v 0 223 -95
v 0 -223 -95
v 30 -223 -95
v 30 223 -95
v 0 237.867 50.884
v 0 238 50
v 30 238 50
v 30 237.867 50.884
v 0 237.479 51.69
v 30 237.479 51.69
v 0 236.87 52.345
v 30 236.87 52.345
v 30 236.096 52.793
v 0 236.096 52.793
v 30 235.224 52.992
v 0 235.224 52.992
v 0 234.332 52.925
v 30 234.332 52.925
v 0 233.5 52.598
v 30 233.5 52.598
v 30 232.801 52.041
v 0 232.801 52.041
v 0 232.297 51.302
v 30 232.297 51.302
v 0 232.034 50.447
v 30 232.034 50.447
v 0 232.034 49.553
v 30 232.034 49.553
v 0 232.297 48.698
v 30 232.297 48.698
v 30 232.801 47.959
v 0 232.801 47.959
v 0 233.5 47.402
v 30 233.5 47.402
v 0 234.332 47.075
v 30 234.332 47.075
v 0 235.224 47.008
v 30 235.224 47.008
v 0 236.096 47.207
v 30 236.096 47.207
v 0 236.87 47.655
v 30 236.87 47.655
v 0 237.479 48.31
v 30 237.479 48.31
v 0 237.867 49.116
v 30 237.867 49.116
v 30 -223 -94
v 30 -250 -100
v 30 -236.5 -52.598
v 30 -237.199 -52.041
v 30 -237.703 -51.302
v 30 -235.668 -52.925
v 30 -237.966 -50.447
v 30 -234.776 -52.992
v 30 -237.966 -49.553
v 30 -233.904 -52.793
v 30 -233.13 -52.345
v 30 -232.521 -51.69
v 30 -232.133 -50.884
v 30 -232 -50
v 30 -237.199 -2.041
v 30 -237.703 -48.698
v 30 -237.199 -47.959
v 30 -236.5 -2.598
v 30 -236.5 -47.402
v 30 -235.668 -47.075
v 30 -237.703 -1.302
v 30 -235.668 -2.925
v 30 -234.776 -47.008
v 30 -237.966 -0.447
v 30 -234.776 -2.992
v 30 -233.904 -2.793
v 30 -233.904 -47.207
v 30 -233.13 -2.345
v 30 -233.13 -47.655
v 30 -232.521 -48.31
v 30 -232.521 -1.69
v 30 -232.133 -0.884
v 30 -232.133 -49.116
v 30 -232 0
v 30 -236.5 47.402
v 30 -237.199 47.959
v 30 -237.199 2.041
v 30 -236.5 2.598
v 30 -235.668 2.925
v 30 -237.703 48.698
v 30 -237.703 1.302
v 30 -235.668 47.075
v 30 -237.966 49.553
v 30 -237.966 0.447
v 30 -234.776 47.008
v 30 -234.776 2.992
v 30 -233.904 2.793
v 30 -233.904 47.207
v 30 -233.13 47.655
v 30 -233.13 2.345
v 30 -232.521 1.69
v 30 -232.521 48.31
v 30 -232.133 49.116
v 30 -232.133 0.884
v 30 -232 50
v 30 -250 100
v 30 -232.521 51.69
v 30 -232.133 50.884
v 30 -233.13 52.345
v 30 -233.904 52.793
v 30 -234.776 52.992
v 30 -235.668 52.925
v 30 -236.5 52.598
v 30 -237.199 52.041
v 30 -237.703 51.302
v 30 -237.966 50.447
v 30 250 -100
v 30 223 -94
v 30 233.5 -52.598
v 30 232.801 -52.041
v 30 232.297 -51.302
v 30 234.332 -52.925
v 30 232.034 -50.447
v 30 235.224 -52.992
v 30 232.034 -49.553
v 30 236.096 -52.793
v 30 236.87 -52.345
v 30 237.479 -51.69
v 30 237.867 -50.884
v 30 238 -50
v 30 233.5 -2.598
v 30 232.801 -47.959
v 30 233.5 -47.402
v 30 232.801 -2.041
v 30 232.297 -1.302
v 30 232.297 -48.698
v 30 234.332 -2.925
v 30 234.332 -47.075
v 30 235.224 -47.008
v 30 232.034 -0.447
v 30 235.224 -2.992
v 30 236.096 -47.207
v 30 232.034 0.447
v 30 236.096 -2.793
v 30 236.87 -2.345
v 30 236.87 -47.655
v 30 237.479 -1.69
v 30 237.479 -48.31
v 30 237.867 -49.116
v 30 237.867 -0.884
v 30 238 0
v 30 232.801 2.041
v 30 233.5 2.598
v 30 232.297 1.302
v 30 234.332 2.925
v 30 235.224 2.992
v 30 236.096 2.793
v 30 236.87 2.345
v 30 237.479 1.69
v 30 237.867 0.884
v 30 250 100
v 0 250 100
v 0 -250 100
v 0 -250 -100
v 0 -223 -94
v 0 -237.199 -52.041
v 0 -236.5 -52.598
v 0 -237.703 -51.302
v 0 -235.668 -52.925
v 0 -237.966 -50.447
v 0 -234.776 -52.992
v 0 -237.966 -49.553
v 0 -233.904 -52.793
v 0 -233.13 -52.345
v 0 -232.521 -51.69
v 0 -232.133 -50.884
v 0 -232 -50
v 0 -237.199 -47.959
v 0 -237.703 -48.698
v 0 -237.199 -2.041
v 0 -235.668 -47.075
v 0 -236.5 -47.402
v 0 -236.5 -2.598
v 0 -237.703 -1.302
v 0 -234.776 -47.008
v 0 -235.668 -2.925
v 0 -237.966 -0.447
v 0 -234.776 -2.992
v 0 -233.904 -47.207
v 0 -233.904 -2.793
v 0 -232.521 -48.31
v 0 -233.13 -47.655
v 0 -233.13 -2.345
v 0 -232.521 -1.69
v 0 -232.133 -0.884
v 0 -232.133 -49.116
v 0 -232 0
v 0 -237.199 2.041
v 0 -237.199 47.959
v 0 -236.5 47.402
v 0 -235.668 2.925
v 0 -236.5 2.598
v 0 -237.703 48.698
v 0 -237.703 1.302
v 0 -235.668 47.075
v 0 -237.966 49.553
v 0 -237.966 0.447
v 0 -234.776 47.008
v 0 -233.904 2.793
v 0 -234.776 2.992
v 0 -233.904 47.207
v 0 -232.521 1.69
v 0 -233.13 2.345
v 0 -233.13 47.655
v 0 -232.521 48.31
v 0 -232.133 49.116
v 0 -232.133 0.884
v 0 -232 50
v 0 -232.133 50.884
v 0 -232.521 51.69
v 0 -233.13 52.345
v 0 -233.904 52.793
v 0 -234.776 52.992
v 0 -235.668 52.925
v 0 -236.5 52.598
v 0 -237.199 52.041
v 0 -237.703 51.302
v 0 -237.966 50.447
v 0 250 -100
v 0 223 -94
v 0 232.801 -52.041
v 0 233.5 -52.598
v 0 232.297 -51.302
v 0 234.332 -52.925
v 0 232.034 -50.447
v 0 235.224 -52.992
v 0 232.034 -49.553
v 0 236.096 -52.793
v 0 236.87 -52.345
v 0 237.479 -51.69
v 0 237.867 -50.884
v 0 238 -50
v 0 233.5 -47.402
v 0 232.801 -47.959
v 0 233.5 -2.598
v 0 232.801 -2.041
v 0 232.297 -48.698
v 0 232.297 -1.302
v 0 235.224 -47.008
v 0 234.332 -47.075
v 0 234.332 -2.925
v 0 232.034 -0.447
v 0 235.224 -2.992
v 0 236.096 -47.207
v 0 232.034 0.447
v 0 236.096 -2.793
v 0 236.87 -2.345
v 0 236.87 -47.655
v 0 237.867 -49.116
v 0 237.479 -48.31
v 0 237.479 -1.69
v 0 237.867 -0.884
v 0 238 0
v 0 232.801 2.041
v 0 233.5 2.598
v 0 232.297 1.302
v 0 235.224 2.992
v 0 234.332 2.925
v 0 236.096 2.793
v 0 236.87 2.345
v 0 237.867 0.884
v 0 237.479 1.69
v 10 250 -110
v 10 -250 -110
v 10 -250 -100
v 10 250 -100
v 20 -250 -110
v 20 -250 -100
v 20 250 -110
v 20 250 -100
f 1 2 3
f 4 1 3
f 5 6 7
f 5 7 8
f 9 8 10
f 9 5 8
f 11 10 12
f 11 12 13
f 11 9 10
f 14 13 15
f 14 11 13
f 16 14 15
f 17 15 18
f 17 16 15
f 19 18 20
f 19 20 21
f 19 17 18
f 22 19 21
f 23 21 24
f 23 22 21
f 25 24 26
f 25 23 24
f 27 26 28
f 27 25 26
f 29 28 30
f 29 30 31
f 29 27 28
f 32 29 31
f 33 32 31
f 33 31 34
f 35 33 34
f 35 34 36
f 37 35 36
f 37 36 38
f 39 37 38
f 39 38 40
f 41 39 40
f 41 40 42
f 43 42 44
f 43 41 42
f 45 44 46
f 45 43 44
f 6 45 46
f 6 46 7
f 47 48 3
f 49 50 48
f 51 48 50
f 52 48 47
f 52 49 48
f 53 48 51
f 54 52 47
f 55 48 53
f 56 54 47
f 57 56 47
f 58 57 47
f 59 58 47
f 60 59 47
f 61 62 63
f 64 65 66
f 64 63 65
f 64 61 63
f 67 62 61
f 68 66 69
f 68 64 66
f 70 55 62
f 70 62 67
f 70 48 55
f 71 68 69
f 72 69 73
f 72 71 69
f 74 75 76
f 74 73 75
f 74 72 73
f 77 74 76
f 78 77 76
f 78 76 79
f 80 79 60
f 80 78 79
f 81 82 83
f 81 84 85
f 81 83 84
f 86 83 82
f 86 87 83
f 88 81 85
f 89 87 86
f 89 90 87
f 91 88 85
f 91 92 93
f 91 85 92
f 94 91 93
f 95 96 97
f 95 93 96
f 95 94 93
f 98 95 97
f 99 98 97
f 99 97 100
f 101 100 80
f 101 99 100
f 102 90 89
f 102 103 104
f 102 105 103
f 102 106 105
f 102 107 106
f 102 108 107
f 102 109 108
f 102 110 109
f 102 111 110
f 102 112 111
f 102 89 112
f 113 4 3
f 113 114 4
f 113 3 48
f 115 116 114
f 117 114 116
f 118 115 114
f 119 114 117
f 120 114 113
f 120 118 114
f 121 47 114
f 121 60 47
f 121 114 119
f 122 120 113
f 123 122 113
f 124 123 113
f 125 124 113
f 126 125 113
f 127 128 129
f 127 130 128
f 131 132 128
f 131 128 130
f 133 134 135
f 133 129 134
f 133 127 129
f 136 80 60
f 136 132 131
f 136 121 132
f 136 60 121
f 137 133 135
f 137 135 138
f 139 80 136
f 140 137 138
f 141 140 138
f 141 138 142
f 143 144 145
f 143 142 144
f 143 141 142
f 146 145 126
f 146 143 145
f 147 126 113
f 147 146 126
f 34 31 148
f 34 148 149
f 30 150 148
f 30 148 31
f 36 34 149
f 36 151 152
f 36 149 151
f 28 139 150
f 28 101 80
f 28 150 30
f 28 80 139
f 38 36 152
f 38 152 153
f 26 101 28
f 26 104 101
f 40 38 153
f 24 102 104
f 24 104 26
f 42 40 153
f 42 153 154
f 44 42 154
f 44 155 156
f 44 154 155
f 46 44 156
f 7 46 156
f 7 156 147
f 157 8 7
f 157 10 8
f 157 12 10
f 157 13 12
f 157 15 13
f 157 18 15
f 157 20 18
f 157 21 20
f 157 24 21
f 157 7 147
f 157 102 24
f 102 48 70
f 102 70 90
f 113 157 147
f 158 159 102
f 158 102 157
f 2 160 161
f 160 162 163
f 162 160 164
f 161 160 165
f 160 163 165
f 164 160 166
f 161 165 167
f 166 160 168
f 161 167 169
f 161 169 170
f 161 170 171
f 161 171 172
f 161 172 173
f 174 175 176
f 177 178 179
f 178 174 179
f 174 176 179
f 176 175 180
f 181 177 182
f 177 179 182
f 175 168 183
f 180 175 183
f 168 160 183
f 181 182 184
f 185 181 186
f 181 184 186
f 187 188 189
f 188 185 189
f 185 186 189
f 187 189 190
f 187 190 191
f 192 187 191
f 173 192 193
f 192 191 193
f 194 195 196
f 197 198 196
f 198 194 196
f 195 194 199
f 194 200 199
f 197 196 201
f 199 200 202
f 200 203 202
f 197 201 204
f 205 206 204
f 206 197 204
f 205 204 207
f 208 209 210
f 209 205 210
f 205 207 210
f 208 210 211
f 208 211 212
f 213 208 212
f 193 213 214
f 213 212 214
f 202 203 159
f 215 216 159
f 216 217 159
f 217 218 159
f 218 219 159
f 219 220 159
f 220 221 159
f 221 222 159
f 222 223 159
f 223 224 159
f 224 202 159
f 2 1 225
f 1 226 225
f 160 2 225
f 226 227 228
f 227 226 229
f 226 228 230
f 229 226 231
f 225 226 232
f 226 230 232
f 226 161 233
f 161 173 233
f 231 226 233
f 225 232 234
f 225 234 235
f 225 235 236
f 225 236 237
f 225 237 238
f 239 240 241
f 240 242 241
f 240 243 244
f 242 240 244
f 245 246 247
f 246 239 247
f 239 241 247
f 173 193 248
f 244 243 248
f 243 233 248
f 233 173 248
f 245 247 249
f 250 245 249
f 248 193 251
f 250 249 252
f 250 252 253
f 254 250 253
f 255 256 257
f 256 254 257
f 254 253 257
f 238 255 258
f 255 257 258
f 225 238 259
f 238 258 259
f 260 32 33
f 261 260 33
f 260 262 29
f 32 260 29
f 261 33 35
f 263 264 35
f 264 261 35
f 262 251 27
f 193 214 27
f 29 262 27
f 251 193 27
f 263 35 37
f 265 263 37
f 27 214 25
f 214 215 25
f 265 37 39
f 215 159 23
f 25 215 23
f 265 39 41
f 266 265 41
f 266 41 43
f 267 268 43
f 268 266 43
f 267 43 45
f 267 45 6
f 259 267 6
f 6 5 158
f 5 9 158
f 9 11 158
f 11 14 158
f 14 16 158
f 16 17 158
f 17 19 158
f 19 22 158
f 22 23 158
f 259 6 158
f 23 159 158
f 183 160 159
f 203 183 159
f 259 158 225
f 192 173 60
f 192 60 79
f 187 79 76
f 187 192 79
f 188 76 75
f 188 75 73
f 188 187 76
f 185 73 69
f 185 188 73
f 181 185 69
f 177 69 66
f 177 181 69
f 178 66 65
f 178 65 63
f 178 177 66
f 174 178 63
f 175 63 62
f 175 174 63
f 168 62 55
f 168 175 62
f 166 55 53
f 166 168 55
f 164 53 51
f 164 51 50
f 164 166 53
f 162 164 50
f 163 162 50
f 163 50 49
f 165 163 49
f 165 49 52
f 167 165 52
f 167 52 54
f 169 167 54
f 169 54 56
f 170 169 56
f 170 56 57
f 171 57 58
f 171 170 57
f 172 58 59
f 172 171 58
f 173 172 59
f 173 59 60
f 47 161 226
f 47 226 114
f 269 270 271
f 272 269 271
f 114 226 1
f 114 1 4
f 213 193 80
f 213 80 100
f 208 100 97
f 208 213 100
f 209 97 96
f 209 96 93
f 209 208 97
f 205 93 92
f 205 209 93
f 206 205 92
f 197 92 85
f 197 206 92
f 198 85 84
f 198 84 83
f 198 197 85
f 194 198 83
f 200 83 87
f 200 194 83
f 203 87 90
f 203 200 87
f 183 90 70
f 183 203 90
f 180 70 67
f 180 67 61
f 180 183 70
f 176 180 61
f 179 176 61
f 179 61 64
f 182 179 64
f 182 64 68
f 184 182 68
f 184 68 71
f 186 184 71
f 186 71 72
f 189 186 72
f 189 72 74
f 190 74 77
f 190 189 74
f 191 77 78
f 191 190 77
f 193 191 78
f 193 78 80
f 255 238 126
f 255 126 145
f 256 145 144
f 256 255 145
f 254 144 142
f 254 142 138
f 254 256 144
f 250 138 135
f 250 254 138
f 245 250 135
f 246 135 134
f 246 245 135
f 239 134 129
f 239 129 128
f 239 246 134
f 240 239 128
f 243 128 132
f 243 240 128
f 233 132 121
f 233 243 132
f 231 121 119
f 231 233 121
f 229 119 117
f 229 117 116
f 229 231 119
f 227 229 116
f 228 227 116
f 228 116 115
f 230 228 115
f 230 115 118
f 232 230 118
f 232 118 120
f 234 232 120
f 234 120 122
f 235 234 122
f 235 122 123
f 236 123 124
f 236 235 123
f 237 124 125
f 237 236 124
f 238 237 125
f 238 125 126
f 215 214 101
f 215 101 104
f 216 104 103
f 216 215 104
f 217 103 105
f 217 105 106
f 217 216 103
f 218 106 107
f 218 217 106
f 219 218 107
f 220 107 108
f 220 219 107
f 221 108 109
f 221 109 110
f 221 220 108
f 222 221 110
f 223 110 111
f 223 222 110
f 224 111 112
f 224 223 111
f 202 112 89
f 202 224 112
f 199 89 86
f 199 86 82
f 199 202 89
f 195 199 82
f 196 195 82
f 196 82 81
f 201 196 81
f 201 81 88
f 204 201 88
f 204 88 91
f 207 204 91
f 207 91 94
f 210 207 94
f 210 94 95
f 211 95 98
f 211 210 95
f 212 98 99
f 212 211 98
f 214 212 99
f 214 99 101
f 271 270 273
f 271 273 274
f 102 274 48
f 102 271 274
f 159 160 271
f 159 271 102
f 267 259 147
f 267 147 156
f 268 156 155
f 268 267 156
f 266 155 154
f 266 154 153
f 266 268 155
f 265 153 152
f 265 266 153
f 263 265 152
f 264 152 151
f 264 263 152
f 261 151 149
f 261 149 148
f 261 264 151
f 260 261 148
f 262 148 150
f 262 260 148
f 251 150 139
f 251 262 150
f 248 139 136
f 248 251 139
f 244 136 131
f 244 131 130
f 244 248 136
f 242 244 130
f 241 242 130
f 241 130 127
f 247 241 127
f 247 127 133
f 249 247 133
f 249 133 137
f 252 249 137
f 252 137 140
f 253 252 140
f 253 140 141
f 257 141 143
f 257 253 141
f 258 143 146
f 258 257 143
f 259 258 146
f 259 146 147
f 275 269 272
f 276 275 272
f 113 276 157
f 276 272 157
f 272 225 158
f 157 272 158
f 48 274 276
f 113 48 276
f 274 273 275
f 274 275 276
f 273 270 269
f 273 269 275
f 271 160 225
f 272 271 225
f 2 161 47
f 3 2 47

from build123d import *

# Parameters (mm, degrees)
F0_W     = 500
F0_H     = 200
F0_R     = 3
F1_DEPTH = 30
F2_W     = 10
F2_H     = 10
F3_DEPTH = 500
F5_START = -27
F4_W     = 30
F4_H     = 1
F5_DEPTH = 446


with BuildPart() as f1:
    # F0 (on Right) → F1 (new body)
    with BuildSketch(Plane.YZ):
        Rectangle(F0_W, F0_H)
        with Locations((-235, -50)):
            Circle(F0_R, mode=Mode.SUBTRACT)
        with Locations((235, -50)):
            Circle(F0_R, mode=Mode.SUBTRACT)
        with Locations((-235, 0)):
            Circle(F0_R, mode=Mode.SUBTRACT)
        with Locations((-235, 50)):
            Circle(F0_R, mode=Mode.SUBTRACT)
        with Locations((235, 0)):
            Circle(F0_R, mode=Mode.SUBTRACT)
        with Locations((235, 50)):
            Circle(F0_R, mode=Mode.SUBTRACT)
    extrude(amount=F1_DEPTH)

    # F2 (on face) → F3 (join)
    with BuildSketch(Plane.XZ.offset(250)):
        with Locations((15, -105)):
            Rectangle(F2_W, F2_H)
    extrude(amount=-F3_DEPTH)

    # F4 (on face) → F5 (cut)
    with BuildSketch(Plane.XZ.offset(250).offset(F5_START)):
        with Locations((15, -94.5)):
            Rectangle(F4_W, F4_H)
    extrude(amount=-F5_DEPTH, mode=Mode.SUBTRACT)


solid = f1.part
